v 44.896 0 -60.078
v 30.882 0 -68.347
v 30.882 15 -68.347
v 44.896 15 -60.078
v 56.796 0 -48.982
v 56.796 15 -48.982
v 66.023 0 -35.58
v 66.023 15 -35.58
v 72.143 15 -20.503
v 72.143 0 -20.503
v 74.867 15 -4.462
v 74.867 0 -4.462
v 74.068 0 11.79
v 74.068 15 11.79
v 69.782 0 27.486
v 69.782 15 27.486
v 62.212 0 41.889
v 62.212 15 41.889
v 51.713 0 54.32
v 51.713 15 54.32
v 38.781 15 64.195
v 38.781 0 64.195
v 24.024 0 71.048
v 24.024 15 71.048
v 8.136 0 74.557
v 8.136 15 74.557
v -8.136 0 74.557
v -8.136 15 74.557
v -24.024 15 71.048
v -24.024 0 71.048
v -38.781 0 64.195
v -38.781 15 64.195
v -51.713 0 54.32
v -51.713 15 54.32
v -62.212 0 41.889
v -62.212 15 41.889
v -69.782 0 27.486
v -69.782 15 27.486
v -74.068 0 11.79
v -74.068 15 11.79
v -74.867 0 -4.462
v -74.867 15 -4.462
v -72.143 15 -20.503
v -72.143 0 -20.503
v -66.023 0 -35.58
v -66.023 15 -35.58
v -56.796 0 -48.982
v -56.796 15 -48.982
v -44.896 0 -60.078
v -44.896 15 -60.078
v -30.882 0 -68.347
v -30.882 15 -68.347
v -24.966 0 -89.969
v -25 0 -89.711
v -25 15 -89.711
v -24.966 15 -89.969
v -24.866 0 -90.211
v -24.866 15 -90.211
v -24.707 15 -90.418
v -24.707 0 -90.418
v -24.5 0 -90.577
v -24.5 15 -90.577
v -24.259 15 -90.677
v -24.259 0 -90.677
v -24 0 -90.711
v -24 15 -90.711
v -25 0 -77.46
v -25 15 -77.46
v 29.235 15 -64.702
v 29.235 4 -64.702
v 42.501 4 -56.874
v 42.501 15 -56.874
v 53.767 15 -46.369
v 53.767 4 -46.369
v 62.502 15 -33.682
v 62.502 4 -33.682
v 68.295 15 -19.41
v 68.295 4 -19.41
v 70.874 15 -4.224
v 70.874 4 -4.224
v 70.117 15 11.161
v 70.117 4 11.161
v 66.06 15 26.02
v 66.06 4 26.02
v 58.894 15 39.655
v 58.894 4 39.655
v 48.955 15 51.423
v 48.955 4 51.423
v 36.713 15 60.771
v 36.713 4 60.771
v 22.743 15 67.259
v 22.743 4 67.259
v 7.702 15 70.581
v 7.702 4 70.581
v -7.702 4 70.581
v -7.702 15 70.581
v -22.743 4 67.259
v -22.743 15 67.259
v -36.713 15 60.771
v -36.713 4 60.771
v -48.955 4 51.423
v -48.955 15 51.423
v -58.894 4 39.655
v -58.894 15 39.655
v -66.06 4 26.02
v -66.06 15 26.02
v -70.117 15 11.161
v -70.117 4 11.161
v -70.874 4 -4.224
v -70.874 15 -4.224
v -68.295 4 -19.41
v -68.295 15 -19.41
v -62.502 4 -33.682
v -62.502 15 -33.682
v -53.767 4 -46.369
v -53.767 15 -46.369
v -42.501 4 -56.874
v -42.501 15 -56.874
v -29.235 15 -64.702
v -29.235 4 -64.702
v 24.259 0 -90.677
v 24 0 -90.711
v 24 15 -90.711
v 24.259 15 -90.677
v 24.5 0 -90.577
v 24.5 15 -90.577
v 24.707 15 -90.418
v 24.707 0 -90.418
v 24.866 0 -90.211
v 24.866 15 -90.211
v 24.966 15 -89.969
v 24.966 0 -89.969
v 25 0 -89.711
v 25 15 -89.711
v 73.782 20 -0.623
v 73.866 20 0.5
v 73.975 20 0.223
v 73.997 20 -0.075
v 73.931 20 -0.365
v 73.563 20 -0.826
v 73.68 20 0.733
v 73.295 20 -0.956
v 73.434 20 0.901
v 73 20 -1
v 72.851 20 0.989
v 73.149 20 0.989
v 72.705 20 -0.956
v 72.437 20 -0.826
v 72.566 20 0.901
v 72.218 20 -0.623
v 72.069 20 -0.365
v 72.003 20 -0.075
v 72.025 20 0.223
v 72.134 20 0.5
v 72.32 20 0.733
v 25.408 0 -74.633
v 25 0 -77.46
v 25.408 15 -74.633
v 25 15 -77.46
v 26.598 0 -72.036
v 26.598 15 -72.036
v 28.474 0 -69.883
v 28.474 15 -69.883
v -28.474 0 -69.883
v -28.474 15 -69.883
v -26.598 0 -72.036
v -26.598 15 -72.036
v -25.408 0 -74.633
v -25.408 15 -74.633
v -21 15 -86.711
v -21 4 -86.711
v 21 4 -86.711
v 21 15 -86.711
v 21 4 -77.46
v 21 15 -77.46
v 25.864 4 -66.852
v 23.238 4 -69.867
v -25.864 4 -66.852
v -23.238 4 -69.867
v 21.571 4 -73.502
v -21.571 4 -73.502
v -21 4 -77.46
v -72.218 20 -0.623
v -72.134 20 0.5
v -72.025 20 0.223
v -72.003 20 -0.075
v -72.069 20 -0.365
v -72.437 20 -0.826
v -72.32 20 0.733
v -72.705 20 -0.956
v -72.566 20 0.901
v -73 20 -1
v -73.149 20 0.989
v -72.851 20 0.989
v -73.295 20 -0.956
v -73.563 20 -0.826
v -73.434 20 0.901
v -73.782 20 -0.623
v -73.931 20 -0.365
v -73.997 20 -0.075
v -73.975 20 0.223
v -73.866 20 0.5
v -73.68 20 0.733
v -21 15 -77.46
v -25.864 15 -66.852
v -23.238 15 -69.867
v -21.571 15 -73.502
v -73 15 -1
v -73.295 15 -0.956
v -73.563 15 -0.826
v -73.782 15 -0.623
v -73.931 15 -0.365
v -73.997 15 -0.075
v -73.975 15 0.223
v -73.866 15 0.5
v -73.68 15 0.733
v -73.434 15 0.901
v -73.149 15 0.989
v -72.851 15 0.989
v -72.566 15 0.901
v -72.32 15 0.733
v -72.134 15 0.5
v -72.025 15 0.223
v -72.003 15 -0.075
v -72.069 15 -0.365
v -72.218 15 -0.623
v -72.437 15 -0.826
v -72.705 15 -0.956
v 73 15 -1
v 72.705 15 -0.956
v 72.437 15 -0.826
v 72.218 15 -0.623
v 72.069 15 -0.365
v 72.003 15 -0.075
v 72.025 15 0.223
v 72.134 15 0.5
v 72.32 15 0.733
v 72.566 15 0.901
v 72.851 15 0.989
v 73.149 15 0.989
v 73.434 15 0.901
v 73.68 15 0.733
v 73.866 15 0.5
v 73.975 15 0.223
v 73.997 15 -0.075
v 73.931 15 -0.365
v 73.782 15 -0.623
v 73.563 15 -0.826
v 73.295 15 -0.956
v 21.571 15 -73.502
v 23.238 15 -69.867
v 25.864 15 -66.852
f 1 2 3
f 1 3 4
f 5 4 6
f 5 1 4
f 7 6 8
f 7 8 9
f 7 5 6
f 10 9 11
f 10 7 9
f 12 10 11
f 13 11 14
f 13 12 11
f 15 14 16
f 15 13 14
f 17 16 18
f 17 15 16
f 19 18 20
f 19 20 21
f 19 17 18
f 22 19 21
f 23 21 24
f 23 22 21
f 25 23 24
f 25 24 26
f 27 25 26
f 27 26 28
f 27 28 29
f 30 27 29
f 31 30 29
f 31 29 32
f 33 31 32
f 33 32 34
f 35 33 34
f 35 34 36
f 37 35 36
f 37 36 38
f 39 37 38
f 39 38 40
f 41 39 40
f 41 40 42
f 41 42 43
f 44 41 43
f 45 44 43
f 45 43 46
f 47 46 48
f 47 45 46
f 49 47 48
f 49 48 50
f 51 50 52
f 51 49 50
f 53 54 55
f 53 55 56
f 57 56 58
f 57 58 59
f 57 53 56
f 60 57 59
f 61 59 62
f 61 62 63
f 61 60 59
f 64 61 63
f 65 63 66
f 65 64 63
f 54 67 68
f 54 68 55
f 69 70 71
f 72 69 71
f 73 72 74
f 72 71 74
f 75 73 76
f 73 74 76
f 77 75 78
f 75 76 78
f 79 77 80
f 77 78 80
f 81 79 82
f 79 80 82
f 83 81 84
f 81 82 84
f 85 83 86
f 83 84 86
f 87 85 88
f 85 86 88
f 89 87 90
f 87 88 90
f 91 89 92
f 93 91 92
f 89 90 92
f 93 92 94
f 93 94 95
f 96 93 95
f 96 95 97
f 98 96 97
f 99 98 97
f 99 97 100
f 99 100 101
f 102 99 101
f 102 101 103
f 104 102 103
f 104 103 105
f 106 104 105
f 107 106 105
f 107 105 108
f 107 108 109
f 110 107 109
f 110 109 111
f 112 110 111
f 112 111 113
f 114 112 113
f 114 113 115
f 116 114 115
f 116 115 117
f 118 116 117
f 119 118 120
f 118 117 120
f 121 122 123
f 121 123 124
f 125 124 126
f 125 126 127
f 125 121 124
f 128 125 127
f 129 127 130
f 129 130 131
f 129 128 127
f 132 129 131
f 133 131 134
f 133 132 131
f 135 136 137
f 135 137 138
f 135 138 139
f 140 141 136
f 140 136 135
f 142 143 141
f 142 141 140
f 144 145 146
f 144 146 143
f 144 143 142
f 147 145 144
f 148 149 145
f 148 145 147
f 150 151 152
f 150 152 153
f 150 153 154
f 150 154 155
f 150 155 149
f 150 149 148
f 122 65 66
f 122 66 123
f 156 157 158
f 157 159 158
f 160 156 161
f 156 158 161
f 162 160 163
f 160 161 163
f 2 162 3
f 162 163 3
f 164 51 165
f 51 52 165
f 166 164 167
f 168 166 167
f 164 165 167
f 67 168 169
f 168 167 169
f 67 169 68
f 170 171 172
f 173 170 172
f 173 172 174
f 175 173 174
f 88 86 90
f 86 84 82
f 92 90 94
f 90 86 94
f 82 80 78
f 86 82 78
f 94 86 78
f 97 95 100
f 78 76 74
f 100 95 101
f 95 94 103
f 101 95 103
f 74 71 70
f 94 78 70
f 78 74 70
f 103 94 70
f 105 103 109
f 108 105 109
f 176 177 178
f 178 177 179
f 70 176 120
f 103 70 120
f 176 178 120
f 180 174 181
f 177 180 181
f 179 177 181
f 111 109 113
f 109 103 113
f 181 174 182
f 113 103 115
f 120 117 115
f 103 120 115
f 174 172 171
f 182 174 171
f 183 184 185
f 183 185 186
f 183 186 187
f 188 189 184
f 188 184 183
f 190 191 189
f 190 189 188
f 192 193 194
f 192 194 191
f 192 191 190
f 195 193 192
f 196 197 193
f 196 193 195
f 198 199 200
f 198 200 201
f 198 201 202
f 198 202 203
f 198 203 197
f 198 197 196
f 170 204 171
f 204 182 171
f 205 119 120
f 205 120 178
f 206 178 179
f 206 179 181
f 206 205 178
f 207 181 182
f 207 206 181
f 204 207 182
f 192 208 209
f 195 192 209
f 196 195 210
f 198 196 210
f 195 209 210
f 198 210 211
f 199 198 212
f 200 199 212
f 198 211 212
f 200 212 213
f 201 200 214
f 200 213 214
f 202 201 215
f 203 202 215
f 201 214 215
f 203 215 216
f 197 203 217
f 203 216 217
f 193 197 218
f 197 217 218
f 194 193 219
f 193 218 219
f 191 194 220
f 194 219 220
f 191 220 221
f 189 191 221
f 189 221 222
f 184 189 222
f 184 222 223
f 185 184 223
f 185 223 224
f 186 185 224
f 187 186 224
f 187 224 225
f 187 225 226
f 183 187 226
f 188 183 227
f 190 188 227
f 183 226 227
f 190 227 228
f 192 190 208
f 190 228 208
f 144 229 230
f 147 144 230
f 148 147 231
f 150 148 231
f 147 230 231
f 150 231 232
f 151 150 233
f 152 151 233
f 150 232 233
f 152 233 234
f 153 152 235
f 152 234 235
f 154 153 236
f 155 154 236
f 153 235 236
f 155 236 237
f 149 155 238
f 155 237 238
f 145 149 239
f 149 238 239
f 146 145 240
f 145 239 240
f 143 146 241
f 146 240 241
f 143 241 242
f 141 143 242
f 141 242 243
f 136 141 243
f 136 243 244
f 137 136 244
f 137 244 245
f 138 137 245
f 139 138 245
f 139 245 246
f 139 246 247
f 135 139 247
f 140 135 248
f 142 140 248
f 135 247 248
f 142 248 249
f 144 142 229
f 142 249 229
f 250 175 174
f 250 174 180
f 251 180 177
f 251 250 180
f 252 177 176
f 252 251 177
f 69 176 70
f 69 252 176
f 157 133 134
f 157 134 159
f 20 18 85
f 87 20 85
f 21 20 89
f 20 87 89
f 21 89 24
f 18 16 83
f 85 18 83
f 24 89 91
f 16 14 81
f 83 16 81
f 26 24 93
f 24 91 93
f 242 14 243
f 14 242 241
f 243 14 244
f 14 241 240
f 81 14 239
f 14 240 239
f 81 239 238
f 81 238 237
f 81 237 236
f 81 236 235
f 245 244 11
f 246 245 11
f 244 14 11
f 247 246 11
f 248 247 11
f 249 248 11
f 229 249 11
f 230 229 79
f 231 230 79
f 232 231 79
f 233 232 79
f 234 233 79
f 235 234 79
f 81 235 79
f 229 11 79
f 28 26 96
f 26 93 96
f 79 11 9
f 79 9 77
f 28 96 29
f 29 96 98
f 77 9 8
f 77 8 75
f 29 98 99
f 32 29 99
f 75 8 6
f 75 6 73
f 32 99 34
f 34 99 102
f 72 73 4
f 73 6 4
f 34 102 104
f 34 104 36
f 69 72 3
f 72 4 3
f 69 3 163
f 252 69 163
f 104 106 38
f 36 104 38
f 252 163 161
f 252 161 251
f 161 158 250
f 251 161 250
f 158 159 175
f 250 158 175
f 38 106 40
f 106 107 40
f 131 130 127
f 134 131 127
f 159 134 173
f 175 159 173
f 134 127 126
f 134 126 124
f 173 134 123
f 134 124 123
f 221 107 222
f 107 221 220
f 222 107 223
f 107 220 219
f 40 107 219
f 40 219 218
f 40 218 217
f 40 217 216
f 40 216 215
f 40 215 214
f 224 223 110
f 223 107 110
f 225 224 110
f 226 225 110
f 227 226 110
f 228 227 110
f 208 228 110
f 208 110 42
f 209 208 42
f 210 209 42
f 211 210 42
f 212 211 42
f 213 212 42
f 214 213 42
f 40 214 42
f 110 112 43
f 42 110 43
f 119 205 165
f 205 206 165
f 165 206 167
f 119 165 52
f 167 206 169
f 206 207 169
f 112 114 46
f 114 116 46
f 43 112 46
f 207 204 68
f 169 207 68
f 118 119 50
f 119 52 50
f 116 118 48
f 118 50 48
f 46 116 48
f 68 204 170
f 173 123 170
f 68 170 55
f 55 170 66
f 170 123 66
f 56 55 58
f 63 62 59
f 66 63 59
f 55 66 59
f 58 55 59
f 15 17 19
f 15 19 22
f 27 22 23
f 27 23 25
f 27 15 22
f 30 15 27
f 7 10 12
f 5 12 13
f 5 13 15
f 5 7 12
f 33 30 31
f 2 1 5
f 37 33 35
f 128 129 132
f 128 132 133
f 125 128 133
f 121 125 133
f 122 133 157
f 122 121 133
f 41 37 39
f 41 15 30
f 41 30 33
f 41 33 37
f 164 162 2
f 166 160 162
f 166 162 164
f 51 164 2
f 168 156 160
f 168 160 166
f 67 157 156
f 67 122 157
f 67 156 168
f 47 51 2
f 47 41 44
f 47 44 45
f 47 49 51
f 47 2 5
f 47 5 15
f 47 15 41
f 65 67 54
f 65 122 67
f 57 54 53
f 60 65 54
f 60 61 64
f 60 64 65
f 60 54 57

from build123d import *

# Parameters (mm, degrees)
BOSS_EXTRUDE1_DEPTH = 15
FILLET2_R           = 10
SHELL1_T            = -4
SKETCH7_R           = 1
BOSS_EXTRUDE4_DEPTH = 5


with BuildPart() as part:
    # Sketch1 → Boss-Extrude1 (new body)
    with BuildSketch(Plane(origin=(0, 0, 0), x_dir=(1, 0, 0), z_dir=(0, 1, 0))):
        with BuildLine():
            Line((-24, 90.710678119), (24, 90.710678119))
            ThreePointArc((24, 90.710678119), (24.707106781, 90.4177849), (25, 89.710678119))
            Line((25, 89.710678119), (25, 70.710678119))
            ThreePointArc((25, 70.710678119), (0, -75), (-25, 70.710678119))
            Line((-25, 70.710678119), (-25, 89.710678119))
            ThreePointArc((-25, 89.710678119), (-24.707106781, 90.4177849), (-24, 90.710678119))
        make_face()
    extrude(amount=BOSS_EXTRUDE1_DEPTH)

    # Fillet2
    fillet2_edges = [part.edges().sort_by_distance(p)[0] for p in [
        (25, 7.5, -70.710678119),
        (-25, 7.5, -70.710678119),
    ]]
    fillet(fillet2_edges, radius=FILLET2_R)

    # Shell1
    shell1_openings = [part.faces().sort_by_distance(p)[0] for p in [
        (0, 15, -3.849203435),
    ]]
    offset(amount=SHELL1_T, openings=shell1_openings)

    # Sketch7 → Boss-Extrude4 (add)
    with BuildSketch(Plane(origin=(0, 15, 0), x_dir=(1, 0, 0), z_dir=(0, 1, 0))):
        with Locations(Location((-73, 0, 0), (0, 0, 90))):  # turned: the seam where the file's is
            Circle(SKETCH7_R)
        with Locations(Location((73, 0, 0), (0, 0, 90))):  # turned: the seam where the file's is
            Circle(SKETCH7_R)
    extrude(amount=BOSS_EXTRUDE4_DEPTH)


solid = part.part
